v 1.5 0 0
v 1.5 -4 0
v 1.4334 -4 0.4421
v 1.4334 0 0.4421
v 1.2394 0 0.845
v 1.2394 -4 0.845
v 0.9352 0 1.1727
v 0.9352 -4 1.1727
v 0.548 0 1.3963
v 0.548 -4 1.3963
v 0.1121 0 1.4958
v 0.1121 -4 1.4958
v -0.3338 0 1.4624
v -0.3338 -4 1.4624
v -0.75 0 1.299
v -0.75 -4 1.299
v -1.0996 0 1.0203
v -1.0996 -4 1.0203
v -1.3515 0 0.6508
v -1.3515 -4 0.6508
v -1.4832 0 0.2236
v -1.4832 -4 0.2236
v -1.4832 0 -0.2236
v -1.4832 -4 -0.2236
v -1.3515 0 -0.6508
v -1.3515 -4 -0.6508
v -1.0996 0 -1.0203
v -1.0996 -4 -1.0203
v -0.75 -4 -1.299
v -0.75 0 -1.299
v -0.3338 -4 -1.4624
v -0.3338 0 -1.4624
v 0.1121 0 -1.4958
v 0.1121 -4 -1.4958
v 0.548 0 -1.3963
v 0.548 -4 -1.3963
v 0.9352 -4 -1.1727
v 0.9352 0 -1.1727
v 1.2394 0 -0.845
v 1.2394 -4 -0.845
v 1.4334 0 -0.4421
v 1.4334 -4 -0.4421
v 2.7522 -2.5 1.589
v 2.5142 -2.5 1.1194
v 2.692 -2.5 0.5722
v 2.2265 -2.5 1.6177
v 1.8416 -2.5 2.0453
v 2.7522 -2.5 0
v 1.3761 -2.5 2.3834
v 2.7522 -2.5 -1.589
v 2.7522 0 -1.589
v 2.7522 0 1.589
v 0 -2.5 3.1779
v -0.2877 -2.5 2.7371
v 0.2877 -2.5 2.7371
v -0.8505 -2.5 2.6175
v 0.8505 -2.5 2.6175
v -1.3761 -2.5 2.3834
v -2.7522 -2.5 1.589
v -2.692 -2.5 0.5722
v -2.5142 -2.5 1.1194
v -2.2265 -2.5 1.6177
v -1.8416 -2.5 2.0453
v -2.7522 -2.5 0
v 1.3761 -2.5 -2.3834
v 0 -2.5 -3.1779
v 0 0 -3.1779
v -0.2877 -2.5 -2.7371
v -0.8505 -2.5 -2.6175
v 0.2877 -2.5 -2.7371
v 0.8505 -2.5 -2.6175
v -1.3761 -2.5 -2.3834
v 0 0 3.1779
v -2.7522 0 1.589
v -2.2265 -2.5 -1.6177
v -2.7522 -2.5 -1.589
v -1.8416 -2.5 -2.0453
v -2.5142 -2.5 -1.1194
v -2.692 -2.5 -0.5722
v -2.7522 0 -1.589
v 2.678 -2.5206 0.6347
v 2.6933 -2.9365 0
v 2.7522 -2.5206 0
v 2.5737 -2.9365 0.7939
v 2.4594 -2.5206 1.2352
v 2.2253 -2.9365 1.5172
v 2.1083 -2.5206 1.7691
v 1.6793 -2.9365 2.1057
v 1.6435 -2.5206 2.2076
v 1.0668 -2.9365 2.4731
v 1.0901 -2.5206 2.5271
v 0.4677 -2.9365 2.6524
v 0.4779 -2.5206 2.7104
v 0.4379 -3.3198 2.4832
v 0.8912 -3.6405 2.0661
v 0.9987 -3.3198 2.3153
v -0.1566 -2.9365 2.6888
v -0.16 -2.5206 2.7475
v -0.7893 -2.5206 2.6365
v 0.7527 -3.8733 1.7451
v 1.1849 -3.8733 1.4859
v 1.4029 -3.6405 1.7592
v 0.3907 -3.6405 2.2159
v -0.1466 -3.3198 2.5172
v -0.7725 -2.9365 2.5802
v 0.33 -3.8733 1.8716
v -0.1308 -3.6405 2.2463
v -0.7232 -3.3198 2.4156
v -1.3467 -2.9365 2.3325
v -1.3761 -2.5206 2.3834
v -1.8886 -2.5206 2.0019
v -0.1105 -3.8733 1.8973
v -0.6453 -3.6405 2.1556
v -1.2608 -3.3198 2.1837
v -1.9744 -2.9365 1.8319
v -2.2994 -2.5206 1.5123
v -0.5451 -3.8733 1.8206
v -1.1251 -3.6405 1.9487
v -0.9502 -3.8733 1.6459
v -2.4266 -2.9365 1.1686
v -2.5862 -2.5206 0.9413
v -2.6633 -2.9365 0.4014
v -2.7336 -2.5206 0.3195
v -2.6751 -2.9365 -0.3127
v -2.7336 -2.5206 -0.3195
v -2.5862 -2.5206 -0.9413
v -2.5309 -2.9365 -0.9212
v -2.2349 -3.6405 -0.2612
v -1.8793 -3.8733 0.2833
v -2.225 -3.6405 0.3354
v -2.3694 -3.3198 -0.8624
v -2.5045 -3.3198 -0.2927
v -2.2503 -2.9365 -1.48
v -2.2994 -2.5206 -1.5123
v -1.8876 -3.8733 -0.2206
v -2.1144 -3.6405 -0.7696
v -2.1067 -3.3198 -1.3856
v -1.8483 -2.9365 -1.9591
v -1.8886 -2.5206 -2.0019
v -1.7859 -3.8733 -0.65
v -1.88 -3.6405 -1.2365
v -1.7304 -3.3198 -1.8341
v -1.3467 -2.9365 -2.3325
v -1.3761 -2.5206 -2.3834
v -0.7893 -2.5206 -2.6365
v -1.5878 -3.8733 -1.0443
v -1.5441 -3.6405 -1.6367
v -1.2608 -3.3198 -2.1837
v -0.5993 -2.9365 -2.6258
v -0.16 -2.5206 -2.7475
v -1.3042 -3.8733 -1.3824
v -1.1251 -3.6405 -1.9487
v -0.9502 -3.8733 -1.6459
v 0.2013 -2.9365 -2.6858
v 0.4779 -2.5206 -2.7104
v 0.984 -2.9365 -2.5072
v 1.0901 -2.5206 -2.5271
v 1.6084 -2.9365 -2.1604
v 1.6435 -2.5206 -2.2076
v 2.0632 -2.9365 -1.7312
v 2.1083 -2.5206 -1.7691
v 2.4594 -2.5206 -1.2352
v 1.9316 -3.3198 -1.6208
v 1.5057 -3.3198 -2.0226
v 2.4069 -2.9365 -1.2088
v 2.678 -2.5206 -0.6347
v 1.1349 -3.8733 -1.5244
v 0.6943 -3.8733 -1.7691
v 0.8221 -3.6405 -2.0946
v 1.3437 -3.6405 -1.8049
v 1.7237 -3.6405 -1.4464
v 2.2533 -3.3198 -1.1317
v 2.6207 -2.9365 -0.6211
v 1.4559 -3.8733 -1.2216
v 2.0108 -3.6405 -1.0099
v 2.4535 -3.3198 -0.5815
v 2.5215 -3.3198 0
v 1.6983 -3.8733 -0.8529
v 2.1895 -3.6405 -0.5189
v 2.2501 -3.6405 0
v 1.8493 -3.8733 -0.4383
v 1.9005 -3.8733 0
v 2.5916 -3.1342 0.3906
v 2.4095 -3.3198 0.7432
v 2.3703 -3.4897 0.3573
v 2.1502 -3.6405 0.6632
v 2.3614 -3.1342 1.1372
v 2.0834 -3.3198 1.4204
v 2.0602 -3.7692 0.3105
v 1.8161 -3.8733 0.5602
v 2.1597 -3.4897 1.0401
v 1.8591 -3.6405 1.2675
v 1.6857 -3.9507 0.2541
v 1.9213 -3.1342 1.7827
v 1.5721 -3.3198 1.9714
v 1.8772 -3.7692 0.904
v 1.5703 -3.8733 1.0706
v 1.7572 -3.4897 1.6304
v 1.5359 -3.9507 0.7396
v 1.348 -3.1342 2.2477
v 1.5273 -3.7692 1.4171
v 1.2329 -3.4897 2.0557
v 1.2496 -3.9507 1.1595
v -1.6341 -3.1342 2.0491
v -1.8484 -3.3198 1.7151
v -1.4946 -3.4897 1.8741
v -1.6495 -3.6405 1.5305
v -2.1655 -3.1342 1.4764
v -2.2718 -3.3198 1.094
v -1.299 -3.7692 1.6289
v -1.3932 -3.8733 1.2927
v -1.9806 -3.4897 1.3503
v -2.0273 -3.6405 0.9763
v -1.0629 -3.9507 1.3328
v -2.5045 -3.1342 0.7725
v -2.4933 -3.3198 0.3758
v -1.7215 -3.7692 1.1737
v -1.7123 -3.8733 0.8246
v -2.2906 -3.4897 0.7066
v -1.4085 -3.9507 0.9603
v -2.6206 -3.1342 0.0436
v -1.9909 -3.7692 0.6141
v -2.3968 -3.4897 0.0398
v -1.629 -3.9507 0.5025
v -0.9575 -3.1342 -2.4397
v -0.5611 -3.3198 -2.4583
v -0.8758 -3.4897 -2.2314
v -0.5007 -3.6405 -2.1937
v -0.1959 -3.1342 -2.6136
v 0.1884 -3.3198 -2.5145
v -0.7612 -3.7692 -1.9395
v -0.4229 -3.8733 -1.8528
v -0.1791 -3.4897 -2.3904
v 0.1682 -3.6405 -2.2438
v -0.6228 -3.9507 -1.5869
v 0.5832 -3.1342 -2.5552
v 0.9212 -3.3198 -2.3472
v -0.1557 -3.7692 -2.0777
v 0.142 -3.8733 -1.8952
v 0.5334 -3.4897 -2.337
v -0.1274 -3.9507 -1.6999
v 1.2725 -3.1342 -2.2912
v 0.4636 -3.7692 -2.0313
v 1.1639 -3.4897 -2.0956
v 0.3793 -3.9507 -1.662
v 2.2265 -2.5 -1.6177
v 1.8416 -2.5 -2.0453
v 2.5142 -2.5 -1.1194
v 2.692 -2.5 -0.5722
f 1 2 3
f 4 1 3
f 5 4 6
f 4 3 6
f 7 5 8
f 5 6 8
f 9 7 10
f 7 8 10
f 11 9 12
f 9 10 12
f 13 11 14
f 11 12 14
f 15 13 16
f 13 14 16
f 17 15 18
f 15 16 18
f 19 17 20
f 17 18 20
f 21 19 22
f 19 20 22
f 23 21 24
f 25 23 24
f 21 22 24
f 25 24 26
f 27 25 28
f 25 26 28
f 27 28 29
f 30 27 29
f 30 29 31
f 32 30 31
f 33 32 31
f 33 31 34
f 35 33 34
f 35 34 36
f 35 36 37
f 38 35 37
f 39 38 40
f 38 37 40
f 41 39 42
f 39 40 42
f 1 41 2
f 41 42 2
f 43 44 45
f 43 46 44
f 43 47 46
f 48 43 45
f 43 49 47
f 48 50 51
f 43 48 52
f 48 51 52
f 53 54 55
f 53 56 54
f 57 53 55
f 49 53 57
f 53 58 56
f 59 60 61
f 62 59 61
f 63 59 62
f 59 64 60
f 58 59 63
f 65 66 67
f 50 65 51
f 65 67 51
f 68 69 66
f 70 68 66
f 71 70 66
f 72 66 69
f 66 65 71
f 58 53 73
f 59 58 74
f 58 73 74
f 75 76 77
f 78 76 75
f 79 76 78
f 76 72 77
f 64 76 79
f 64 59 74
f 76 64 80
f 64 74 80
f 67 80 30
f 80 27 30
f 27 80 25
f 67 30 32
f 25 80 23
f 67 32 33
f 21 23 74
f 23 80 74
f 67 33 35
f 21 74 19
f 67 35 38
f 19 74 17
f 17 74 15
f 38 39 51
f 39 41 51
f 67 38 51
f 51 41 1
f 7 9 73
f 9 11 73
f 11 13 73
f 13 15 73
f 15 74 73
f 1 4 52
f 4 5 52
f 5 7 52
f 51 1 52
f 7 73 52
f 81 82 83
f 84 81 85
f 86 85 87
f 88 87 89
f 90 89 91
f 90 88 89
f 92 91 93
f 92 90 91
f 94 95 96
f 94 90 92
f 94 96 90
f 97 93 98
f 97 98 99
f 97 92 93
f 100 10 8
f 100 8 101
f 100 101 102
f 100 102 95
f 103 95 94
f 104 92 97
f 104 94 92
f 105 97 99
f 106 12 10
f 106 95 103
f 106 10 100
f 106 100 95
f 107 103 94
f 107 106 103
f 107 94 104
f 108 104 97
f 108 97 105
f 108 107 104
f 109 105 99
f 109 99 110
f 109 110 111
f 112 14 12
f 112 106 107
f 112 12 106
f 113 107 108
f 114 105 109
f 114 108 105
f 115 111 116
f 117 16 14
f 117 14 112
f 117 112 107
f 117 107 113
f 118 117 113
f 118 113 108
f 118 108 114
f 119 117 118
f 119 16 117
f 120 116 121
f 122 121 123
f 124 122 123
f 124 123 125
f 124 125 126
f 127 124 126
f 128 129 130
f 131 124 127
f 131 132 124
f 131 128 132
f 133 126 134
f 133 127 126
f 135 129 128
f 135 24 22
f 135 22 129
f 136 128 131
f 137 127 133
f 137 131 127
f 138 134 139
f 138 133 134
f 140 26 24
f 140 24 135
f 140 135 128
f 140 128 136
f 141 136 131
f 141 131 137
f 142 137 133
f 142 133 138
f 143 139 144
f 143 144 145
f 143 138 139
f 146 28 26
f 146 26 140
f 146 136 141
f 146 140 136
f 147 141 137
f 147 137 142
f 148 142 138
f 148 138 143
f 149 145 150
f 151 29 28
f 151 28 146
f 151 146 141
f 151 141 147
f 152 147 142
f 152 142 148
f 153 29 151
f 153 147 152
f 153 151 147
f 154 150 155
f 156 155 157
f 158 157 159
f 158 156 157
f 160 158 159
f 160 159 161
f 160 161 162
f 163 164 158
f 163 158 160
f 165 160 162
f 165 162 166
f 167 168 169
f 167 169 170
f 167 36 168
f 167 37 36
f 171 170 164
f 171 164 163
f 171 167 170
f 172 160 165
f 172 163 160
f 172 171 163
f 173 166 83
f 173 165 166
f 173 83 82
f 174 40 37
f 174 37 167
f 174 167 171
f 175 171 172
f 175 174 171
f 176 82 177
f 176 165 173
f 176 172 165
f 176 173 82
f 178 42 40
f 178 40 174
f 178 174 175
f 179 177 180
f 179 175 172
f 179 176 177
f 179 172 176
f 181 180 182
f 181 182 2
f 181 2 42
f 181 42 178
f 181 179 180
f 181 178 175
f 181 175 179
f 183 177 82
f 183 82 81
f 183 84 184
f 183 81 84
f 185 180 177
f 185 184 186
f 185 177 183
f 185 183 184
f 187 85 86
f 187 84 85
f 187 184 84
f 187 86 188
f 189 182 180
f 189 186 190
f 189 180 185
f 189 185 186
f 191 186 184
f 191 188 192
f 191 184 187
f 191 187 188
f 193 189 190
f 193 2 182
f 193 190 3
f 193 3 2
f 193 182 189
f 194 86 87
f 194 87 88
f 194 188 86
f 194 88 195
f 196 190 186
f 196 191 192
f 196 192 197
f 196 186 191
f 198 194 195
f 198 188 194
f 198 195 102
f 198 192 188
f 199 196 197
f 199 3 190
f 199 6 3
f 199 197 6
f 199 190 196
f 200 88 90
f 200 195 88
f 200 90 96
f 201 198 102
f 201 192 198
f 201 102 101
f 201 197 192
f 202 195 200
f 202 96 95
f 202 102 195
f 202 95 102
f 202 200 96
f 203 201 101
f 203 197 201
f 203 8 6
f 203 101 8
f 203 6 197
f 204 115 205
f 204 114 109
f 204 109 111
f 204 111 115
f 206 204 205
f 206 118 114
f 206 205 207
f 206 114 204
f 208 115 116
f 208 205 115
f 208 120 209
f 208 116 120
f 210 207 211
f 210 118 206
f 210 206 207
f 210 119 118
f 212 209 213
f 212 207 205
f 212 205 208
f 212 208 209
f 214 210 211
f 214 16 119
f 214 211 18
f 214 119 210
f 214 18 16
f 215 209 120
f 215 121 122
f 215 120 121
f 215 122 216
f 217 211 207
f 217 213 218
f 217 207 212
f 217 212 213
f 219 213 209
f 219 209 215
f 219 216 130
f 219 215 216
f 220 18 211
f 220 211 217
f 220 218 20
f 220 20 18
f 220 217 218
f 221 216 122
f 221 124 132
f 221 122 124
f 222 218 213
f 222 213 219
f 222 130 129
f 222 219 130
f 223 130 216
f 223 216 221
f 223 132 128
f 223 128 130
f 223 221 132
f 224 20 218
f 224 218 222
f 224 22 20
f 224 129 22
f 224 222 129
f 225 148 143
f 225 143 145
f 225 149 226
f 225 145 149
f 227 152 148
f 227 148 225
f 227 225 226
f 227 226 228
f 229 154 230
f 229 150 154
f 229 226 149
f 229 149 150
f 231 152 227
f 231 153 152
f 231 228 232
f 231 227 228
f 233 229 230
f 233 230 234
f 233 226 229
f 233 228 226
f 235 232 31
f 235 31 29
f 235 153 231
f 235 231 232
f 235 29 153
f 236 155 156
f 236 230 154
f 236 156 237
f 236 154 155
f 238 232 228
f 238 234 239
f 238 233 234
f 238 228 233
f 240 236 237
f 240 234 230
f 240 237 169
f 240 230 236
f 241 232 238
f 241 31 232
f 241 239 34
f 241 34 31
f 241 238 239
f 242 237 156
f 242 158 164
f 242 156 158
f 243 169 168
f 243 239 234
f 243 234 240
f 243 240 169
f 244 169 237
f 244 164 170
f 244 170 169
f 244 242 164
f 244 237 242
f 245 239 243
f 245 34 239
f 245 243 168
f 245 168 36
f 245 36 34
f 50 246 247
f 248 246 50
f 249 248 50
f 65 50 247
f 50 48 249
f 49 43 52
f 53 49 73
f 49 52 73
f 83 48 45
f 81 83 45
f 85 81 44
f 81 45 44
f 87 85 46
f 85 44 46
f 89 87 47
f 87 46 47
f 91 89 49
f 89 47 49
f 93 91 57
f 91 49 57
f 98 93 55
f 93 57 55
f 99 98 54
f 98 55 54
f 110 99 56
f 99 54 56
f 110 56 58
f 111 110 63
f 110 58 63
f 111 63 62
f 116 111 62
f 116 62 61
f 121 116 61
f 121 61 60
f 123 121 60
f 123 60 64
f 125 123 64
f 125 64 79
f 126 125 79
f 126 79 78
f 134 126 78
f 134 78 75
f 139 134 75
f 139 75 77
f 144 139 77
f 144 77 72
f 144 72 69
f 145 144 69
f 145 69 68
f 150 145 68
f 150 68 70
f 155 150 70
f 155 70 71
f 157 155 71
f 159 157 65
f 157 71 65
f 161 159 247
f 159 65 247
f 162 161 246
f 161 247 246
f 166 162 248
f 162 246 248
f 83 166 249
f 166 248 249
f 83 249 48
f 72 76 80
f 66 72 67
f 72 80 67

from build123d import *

# Parameters (mm, degrees)
F1_DEPTH = 2.5
F2_R     = 2.7521630024
F3_DEPTH = 1.5
F4_R     = 1.5
F5_DEPTH = 4


# Not quite as in the source:
# - a fillet or chamfer that OpenCascade refuses, or shapes differently, is made with other operations: its cross-section is extruded or revolved along the edge and cut away or added


with BuildPart() as f1:
    # F0 (on Front) → F1 (new body)
    with BuildSketch(Plane.XZ):
        Polygon((0, -3.1779241005), (2.7521630024, -1.5889620503), (2.7521630024, 1.5889620503), (0, 3.1779241005), (-2.7521630024, 1.5889620503), (-2.7521630024, -1.5889620503), align=None)
    extrude(amount=F1_DEPTH)

    # F2 (on face) → F3 (join)
    with BuildSketch(Plane.XZ.offset(2.5)):
        Circle(F2_R)
    extrude(amount=F3_DEPTH)

    # F4 (on face) → F5 (cut, through all)
    with BuildSketch(Plane.XZ.offset(4)):
        Circle(F4_R)
    extrude(amount=-F5_DEPTH, mode=Mode.SUBTRACT)

    # F6: fillet of radius 1.5 on 1 edges, made by hand

    # F6_s1 → F6_t2 (revolve, cut)
    with BuildSketch(Plane.XY):
        with BuildLine():
            ThreePointArc((2.7521630024, -2.5206160665), (2.3970986985, -3.4896992682), (1.5, -4))
            Line((1.5, -4), (2.7521630024, -4))
            Line((2.7521630024, -4), (2.7521630024, -2.5206160665))
        make_face()
    revolve(axis=Axis((0, -4, 0), (0, -1, 0)), mode=Mode.SUBTRACT)


solid = f1.part
